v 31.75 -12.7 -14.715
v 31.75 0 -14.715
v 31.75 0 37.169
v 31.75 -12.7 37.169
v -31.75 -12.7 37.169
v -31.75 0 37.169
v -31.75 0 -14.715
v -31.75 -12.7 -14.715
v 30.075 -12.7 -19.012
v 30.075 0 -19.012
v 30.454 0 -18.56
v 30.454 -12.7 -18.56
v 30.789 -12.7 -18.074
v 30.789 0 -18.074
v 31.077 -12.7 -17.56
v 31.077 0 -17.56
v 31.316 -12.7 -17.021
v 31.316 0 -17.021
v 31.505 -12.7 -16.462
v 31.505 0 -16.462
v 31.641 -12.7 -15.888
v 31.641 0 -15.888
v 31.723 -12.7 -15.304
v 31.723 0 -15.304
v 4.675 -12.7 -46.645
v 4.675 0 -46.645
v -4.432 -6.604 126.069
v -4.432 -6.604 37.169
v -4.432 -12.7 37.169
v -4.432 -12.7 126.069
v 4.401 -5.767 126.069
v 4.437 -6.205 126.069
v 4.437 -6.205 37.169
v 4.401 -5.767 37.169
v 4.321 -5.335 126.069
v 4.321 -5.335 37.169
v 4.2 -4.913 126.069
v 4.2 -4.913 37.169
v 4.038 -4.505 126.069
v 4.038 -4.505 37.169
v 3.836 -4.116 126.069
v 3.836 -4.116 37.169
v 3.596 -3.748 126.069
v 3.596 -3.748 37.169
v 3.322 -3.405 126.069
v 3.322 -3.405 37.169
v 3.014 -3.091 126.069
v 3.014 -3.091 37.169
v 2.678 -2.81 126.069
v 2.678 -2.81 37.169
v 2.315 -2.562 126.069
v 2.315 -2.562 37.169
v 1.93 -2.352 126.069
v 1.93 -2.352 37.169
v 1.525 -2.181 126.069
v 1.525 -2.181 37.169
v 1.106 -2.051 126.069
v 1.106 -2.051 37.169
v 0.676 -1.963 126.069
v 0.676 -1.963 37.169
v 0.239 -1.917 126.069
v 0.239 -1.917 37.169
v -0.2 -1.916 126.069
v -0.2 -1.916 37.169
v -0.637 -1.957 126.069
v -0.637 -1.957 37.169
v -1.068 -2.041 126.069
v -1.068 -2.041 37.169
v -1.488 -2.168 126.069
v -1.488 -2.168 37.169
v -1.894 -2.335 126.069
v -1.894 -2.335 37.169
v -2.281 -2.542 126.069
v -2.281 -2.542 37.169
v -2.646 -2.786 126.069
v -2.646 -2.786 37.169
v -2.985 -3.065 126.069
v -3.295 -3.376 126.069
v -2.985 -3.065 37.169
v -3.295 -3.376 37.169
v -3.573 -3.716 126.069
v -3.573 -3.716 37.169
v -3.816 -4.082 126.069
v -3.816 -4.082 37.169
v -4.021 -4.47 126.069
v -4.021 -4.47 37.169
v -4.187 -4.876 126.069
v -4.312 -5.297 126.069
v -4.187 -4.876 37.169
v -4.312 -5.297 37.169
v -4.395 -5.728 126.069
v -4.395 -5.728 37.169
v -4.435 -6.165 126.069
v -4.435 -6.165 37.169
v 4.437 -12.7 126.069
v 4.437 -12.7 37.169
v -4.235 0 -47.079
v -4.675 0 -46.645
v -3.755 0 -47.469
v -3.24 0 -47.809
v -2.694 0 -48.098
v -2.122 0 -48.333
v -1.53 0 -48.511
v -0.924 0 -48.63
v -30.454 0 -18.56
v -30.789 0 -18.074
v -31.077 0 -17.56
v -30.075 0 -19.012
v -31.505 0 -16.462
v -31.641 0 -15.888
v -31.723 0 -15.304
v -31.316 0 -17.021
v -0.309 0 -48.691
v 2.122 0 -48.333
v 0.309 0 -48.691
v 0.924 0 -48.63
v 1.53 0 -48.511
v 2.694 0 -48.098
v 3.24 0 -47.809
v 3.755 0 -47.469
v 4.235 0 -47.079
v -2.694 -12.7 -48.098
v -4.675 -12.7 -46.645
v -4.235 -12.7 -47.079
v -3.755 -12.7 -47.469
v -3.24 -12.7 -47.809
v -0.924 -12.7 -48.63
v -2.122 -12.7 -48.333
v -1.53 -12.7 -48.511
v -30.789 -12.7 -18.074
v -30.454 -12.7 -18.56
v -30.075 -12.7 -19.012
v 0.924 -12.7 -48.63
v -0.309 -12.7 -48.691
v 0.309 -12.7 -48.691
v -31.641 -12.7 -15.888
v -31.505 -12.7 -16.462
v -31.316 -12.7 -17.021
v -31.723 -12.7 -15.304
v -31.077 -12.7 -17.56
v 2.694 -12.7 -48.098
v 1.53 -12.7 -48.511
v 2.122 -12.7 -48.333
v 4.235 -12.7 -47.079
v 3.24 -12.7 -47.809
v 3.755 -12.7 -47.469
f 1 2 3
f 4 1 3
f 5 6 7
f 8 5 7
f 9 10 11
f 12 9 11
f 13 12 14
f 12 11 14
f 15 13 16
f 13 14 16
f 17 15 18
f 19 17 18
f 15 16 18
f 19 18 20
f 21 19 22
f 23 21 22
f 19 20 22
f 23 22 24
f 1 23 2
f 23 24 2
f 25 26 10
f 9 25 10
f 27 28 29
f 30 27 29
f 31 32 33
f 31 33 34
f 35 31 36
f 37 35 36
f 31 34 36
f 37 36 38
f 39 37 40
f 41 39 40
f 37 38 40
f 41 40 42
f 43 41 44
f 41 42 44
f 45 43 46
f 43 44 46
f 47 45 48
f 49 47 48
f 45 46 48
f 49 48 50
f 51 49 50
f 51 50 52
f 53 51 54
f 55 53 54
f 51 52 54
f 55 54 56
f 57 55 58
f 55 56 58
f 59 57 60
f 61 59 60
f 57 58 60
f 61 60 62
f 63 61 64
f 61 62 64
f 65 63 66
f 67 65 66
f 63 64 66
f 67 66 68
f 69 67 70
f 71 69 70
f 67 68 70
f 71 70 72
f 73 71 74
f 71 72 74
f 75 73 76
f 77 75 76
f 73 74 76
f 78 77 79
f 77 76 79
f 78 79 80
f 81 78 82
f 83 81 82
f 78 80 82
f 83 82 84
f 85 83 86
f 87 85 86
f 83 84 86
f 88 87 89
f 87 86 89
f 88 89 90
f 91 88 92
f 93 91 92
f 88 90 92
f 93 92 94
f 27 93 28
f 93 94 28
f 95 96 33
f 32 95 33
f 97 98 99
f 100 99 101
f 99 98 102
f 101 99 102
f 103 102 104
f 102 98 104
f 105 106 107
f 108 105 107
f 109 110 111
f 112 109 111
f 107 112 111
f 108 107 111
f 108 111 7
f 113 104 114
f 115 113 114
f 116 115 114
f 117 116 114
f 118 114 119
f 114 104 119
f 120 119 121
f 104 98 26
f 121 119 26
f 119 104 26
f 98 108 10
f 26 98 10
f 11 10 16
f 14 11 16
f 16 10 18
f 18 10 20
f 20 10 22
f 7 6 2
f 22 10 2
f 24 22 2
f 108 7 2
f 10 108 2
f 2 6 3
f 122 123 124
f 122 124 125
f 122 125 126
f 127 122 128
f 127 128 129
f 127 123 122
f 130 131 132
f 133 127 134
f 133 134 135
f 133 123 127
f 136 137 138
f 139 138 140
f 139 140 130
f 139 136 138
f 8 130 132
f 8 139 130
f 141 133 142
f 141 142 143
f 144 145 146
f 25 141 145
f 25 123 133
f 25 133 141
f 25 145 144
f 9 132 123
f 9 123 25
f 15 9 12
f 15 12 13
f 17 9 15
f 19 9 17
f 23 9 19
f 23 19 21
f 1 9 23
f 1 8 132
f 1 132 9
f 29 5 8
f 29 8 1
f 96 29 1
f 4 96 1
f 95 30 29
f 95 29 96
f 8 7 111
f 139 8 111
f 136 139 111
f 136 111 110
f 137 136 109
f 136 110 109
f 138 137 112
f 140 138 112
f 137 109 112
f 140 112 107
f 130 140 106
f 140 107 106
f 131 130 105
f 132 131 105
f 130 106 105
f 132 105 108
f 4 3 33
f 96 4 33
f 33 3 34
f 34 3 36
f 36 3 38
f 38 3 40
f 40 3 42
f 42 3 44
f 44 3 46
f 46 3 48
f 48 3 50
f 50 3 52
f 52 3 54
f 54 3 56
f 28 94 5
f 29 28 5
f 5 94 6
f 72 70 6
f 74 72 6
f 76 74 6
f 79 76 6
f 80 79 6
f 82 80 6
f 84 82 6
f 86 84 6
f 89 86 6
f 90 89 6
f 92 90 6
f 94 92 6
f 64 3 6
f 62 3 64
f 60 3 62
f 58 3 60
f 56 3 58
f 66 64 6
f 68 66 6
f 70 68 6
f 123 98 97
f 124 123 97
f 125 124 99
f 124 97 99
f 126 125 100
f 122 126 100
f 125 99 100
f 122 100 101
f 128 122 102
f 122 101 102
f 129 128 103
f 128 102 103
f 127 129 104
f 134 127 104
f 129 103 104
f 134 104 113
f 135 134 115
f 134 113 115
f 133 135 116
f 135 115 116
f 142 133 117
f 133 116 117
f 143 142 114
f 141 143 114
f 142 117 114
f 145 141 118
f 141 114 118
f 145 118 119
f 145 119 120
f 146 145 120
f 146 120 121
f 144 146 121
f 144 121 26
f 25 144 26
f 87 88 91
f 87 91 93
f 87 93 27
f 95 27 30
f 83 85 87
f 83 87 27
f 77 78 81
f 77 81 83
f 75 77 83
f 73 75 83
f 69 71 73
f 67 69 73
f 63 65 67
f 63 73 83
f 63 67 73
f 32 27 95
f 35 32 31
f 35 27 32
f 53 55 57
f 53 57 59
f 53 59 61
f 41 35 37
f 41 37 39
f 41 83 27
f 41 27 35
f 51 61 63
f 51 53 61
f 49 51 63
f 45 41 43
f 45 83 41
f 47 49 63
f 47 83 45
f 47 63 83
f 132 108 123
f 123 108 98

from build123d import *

# Parameters (mm, degrees)
F1_DEPTH = 12.7
F3_DEPTH = 88.9


with BuildPart() as f1:
    # F0 (on Front) → F1 (new body)
    with BuildSketch(Plane.XZ):
        with BuildLine():
            Line((31.75, 37.1686270936), (-31.75, 37.1686270936))
            Line((-31.75, 37.1686270936), (-31.75, -14.7149503491))
            ThreePointArc((-31.75, -14.7149503491), (-31.316464033, -17.0210191569), (-30.0750540643, -19.0122017377))
            Line((-30.0750540643, -19.0122017377), (-4.6750540643, -46.6453007808))
            ThreePointArc((-4.6750540643, -46.6453007808), (0, -48.6980493923), (4.6750540643, -46.6453007808))
            Line((4.6750540643, -46.6453007808), (30.0750540643, -19.0122017377))
            ThreePointArc((30.0750540643, -19.0122017377), (31.316464033, -17.0210191569), (31.75, -14.7149503491))
            Line((31.75, -14.7149503491), (31.75, 37.1686270936))
        make_face()
    extrude(amount=F1_DEPTH)

    # F2 (on face) → F3 (join)
    with BuildSketch(Plane.XY.offset(37.1686270936)):
        with BuildLine():
            Line((-4.4317082143, -6.6040777501), (-4.4317082143, -12.7))
            Line((-4.4317082143, -12.7), (4.4366029292, -12.7))
            Line((4.4366029292, -12.7), (4.4366029292, -6.4954223107))
            ThreePointArc((4.4366029292, -6.4954223107), (0.0543828161, -10.7886524654), (-4.4317082143, -6.6040777501))
        make_face()
        with BuildLine():
            ThreePointArc((4.4366029292, -6.2045776893), (-0.1997650225, -1.9155116264), (-4.4317082143, -6.6040777501))
            ThreePointArc((-4.4317082143, -6.6040777501), (0.0543828161, -10.7886524654), (4.4366029292, -6.4954223107))
            Line((4.4366029292, -6.4954223107), (4.4366029292, -6.2045776893))
        make_face()
    extrude(amount=F3_DEPTH)


solid = f1.part
